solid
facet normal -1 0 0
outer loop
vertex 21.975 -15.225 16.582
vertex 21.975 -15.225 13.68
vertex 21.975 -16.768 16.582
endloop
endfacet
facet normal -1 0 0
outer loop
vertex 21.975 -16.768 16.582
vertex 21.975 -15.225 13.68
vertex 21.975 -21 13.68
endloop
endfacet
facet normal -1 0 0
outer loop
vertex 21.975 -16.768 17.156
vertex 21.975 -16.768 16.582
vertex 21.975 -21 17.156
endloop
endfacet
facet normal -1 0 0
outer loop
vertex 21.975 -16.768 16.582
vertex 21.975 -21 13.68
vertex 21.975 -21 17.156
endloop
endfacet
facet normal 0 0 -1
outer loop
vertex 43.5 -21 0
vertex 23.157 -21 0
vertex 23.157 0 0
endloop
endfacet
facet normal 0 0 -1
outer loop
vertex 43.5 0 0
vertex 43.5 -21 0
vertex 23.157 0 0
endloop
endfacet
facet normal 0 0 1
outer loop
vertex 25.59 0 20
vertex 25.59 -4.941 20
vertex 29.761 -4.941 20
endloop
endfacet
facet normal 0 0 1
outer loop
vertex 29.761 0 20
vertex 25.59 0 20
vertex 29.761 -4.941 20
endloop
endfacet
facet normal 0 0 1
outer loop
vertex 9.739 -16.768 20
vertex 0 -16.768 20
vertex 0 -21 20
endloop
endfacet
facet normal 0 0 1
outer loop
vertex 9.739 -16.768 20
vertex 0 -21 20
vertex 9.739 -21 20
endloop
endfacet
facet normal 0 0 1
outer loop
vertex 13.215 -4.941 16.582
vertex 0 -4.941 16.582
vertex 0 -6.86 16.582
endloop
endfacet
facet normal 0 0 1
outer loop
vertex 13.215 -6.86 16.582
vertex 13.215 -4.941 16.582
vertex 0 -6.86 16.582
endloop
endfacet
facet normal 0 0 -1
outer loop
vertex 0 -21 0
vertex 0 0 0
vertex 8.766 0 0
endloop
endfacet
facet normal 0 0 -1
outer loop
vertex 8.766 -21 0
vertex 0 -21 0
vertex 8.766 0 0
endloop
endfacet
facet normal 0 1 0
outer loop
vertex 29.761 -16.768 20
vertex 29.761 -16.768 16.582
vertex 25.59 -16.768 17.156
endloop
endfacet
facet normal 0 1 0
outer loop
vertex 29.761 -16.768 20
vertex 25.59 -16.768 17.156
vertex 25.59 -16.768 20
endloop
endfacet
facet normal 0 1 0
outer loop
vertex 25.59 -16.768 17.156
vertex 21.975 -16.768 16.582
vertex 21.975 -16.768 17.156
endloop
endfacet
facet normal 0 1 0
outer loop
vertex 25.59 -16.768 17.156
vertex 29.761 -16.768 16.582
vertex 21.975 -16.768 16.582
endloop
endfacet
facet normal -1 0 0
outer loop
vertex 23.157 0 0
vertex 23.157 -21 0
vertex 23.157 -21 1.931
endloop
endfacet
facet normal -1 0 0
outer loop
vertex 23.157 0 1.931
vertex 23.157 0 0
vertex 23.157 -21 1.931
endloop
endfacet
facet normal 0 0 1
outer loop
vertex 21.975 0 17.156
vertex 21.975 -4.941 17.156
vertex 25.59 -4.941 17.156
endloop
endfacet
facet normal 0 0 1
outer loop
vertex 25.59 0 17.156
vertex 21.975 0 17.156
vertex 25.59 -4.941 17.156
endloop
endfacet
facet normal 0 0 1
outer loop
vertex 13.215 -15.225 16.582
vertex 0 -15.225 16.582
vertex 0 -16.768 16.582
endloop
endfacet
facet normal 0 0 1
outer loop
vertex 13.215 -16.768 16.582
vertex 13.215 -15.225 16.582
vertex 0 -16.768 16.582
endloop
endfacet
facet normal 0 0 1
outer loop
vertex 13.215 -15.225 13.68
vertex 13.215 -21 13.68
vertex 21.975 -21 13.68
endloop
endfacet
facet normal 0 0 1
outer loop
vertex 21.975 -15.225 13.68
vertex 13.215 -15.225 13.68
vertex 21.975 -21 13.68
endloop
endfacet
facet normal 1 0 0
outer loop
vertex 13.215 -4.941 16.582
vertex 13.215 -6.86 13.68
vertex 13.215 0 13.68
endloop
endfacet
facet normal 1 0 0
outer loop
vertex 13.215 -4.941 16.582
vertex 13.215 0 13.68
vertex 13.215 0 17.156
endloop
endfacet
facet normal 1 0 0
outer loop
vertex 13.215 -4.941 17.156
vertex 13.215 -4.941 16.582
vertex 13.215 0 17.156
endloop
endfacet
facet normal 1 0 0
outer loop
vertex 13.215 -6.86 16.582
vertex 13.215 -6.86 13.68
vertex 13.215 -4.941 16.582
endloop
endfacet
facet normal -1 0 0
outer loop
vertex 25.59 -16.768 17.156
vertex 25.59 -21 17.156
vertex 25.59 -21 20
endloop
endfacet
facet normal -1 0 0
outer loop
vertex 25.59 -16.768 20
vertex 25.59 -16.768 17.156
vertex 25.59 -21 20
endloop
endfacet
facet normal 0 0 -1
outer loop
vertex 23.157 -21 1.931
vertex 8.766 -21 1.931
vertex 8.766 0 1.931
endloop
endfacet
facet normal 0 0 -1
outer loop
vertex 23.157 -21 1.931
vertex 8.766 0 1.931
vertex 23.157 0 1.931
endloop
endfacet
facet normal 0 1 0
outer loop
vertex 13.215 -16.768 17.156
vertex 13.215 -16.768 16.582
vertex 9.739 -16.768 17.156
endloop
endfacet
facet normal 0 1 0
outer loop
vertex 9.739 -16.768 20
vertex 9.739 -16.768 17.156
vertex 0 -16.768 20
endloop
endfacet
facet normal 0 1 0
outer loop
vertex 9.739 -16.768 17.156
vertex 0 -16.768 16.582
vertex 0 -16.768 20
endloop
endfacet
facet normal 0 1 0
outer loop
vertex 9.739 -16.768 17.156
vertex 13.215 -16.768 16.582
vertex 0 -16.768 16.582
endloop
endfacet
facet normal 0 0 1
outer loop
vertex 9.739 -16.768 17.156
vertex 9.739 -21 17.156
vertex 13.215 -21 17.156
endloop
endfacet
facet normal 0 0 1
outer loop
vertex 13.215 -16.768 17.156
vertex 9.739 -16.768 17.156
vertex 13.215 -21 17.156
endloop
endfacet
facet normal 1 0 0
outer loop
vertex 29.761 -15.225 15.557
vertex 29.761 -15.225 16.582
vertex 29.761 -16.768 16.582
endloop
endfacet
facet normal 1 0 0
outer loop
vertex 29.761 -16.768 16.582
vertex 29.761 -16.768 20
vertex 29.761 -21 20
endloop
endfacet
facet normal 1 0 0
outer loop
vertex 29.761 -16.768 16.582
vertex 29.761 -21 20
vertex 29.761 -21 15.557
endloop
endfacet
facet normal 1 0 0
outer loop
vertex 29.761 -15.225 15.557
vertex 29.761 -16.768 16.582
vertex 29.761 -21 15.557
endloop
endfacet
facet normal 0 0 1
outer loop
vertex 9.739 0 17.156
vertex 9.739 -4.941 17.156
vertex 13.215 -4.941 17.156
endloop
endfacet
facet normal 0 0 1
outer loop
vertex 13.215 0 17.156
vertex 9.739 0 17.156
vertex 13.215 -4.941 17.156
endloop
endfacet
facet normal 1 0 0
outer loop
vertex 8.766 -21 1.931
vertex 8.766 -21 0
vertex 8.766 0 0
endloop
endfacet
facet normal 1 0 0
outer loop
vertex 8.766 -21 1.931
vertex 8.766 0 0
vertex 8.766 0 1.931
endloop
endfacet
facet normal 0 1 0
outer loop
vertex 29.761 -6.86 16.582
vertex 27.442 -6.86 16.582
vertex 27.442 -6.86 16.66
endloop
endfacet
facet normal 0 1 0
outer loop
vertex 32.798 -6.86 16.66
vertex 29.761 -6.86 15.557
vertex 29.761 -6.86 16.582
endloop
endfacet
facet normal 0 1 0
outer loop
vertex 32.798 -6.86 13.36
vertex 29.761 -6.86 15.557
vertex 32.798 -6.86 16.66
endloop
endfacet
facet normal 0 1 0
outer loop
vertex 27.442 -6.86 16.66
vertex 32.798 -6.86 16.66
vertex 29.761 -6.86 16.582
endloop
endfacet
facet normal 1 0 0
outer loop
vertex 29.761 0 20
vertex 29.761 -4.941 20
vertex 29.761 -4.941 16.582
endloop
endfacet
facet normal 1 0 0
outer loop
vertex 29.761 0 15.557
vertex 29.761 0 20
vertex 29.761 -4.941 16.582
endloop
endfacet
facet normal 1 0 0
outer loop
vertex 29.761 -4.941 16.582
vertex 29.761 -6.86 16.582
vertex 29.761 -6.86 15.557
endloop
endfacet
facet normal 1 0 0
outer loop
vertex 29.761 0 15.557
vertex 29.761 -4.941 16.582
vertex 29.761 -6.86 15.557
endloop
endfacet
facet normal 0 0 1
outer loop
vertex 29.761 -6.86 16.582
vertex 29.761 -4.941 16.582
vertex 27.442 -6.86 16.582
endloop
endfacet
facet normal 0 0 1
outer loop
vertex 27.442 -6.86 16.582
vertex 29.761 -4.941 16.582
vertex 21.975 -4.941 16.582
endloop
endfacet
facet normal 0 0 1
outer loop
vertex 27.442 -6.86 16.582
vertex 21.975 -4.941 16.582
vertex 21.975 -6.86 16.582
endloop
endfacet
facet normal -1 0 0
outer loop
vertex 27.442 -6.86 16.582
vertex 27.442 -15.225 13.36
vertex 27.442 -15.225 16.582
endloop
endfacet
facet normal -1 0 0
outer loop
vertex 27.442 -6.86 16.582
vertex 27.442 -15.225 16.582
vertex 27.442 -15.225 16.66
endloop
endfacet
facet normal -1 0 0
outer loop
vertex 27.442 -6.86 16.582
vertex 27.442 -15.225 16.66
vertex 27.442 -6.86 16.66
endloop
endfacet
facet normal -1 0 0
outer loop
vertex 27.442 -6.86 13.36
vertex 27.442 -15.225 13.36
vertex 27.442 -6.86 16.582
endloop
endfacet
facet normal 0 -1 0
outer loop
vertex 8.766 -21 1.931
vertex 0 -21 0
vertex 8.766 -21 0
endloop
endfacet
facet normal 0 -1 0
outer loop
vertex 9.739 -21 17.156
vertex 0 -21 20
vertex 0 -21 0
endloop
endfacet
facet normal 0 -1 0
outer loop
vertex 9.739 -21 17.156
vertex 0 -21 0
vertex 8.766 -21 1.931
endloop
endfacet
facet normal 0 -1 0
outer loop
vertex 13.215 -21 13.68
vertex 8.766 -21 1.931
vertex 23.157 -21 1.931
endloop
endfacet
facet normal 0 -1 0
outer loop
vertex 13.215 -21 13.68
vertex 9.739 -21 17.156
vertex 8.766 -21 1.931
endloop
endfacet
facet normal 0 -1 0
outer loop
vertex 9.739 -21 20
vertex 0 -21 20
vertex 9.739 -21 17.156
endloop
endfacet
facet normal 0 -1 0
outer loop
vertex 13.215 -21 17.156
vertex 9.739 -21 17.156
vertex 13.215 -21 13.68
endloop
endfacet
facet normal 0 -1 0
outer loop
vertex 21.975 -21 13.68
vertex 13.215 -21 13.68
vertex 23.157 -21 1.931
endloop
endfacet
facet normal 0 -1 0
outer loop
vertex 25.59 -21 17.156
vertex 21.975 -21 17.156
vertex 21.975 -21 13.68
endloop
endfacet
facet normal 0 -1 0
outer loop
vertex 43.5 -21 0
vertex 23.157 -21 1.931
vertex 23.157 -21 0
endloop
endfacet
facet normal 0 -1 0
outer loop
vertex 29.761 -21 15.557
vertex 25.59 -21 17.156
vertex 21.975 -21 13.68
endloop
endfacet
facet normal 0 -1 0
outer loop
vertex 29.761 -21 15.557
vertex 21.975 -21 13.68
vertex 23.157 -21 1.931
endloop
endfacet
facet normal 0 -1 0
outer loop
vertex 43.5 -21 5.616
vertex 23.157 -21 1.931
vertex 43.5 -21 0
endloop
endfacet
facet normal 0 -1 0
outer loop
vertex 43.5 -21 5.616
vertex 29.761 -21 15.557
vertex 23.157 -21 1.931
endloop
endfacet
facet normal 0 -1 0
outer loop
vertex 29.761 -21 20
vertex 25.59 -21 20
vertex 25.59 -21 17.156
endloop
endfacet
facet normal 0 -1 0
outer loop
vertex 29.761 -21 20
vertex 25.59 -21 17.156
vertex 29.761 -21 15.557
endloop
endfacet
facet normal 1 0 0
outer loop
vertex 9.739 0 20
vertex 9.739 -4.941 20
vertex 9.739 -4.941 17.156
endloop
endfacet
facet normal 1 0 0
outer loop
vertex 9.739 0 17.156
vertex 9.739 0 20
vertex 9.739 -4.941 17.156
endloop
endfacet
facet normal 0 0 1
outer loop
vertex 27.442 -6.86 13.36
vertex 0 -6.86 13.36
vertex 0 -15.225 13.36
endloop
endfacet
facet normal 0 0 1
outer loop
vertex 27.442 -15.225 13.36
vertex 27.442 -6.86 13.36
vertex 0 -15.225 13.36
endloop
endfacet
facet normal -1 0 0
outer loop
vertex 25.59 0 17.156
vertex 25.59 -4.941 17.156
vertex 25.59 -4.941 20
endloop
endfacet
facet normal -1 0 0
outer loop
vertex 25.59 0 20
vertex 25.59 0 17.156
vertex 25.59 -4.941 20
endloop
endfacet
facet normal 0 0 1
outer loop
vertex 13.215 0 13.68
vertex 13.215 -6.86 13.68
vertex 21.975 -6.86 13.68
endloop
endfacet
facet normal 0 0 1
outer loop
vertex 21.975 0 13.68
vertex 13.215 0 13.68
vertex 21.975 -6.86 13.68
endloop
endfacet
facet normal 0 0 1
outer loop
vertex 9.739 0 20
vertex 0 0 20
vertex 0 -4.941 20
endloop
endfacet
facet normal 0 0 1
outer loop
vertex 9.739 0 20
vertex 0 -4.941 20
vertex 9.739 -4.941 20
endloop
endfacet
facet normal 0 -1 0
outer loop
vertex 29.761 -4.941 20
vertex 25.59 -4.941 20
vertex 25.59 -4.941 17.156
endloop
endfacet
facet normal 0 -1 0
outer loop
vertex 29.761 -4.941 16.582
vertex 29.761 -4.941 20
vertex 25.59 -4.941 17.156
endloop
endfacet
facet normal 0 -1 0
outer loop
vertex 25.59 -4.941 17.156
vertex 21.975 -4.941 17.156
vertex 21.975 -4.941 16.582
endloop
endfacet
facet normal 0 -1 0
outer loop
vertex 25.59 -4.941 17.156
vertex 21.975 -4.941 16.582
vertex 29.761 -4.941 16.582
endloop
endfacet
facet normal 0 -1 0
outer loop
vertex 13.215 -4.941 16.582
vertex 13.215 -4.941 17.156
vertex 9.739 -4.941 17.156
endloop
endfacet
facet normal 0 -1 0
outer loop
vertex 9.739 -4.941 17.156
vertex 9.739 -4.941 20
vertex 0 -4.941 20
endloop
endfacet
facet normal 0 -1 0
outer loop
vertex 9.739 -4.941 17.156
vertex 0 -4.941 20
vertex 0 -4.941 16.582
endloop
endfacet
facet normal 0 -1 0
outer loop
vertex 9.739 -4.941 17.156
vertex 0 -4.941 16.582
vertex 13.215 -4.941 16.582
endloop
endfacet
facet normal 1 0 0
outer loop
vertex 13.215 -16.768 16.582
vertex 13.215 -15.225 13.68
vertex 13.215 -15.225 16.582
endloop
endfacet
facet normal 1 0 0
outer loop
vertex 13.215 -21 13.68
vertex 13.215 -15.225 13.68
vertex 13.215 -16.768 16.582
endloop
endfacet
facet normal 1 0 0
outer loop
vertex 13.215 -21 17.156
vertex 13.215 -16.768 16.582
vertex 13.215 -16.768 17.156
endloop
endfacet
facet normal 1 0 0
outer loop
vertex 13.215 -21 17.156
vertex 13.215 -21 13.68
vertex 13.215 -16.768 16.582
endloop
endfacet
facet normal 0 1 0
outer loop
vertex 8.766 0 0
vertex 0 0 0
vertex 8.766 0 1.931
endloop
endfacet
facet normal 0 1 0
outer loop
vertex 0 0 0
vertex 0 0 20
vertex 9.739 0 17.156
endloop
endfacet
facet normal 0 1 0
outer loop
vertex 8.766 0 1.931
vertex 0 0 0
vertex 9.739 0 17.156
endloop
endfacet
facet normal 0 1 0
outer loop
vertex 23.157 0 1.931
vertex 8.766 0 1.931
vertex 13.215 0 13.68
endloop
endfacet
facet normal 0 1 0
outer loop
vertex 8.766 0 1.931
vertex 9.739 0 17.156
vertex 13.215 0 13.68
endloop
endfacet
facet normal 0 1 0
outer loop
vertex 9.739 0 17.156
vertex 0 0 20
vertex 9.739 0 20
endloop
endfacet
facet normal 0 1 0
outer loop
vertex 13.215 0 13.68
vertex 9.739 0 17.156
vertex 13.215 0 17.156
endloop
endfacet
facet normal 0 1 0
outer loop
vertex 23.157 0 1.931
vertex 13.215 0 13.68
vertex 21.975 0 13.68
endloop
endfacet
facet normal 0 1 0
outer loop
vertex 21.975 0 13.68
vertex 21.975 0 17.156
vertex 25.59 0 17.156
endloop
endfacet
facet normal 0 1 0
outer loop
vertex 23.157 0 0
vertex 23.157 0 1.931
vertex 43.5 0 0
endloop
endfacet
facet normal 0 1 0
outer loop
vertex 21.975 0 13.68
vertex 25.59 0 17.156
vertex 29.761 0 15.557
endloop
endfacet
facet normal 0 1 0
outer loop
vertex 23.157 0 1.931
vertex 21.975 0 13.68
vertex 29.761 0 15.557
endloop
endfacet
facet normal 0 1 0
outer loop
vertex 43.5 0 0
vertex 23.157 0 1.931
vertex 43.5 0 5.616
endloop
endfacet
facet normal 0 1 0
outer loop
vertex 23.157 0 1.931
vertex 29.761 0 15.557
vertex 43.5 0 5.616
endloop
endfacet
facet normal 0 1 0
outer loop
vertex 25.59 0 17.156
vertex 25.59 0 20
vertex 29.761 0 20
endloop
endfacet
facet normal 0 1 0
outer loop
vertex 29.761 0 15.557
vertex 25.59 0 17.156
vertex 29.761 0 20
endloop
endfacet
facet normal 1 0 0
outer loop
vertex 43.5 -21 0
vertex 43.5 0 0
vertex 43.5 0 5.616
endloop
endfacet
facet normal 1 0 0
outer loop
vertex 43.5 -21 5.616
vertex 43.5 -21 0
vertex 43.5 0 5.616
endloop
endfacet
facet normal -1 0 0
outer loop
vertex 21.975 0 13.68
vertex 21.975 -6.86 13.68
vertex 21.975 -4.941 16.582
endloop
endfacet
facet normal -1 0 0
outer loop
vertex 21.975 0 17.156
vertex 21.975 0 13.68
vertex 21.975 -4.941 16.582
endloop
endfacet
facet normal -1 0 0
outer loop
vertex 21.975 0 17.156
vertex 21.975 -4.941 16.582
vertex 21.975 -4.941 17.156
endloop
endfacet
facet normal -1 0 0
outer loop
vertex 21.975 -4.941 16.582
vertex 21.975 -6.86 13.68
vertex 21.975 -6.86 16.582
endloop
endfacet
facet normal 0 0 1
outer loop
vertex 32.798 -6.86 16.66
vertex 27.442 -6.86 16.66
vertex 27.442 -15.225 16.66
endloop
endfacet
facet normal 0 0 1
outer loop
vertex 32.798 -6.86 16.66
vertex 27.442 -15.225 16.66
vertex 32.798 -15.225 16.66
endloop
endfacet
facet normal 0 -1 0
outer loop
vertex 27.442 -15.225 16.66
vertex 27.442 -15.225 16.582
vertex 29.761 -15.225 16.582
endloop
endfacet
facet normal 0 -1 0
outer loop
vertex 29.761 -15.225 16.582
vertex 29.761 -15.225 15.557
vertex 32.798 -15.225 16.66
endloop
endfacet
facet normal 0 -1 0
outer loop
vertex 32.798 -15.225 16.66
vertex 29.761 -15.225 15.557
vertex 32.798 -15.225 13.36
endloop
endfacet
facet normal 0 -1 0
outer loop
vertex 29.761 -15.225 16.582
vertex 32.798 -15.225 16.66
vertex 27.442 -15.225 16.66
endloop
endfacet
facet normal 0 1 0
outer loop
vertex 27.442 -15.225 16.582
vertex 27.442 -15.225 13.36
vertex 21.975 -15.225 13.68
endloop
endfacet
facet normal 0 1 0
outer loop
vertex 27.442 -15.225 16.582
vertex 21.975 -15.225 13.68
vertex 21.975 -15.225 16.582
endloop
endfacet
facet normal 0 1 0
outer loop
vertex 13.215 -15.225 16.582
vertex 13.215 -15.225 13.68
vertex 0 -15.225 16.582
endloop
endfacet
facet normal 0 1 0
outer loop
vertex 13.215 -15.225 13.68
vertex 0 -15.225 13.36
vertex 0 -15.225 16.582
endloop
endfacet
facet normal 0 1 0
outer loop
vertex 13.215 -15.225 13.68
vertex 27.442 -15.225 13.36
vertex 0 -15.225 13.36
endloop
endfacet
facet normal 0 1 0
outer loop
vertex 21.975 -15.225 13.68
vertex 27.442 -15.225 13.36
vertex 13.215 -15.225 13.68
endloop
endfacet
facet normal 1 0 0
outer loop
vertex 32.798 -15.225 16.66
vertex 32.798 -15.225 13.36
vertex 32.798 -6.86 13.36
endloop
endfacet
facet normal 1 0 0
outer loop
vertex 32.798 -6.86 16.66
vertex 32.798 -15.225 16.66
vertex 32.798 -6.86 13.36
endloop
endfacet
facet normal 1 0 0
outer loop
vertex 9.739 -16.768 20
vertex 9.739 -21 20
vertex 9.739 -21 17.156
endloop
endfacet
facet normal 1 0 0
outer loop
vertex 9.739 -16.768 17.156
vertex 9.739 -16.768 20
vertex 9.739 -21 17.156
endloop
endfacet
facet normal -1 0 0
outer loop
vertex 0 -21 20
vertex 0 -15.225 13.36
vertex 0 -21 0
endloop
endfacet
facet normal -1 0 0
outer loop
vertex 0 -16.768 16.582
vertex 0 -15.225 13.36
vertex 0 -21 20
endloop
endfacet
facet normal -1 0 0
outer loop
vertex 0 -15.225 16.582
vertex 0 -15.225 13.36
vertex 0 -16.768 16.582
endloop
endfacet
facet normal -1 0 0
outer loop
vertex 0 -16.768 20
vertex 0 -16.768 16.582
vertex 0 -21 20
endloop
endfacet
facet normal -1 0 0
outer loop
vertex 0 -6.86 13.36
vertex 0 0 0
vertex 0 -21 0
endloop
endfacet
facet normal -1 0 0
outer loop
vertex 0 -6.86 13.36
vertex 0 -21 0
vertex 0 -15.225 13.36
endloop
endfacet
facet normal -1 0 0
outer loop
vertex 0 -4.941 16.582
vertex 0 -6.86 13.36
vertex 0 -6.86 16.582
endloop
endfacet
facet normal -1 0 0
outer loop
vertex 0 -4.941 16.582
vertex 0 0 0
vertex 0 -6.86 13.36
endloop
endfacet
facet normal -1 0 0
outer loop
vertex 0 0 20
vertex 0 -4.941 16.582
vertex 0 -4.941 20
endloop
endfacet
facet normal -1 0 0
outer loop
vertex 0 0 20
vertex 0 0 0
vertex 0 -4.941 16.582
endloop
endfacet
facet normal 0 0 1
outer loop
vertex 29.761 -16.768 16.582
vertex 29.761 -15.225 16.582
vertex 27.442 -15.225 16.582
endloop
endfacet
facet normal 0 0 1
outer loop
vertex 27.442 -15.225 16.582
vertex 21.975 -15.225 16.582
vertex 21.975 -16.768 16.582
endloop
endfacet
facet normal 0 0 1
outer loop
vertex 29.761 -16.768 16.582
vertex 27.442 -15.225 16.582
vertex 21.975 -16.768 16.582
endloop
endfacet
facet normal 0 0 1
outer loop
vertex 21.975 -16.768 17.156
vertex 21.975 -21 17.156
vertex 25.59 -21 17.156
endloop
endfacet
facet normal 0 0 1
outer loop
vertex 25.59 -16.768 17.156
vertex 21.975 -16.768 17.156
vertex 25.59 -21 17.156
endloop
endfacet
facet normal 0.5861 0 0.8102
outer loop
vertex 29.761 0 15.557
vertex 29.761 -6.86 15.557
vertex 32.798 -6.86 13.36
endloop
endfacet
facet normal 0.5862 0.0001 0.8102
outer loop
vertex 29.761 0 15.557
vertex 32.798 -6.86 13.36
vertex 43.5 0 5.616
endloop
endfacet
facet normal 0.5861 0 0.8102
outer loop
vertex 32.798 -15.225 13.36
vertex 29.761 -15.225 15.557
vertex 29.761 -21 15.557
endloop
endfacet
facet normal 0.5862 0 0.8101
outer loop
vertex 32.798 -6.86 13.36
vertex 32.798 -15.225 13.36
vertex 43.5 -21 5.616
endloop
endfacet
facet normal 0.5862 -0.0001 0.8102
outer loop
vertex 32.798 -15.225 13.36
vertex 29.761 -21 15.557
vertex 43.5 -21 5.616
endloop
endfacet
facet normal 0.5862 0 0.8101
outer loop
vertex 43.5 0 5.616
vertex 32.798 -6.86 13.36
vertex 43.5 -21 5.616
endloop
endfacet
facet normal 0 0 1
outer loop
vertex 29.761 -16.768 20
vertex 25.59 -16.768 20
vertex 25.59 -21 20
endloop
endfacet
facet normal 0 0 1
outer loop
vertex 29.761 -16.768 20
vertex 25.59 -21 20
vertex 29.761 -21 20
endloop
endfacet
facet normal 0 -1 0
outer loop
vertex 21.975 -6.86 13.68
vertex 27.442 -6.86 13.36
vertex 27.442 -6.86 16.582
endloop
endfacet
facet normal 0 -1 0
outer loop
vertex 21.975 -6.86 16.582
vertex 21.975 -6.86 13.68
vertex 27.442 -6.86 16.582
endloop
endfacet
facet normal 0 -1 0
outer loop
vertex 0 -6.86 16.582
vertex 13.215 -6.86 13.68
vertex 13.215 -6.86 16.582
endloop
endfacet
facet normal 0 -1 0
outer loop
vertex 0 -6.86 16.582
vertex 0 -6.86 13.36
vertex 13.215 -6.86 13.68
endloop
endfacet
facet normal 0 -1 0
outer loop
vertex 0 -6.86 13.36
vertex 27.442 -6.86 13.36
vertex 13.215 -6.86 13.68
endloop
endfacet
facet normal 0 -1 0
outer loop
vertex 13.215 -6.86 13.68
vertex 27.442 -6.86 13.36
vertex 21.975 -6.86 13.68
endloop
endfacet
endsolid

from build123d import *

# Parameters (mm, degrees)
F0_W      = 43.5
F0_H      = 20
F1_DEPTH  = 21
F2_W      = 23.5
F2_H      = 2
F3_DEPTH  = 79
F4_W      = 8.7595684454
F4_H      = 3.4760199487
F4_W_2    = 14.3907200545
F4_H_2    = 1.9311879296
F5_DEPTH  = 21.001
F6_W      = 18.0619247258
F6_H      = 11.0779828392
F7_DEPTH  = 20.001
F8_W      = 8.364611771
F8_H      = 3.2224319875
F9_DEPTH  = 43.501
F10_DEPTH = 13.8
F11_DEPTH = 16.0159093717
F12_W     = 5.3562937983
F12_H     = 8.364611771
F13_DEPTH = 3.3


# Not quite as in the source:
# - an extrude ends at something that could not be found from the text; its depth is read off the source's solid


with BuildPart() as f1:
    # F0 (on Front) → F1 (new body)
    with BuildSketch(Plane.XZ):
        with Locations((21.75, 10)):
            Rectangle(F0_W, F0_H)
    extrude(amount=F1_DEPTH)

    # F2 (on Front) → F3 (cut, through all)
    with BuildSketch(Plane.XZ):
        with Locations((15.8696506918, 1)):
            Rectangle(F2_W, F2_H)
    extrude(amount=-F3_DEPTH, mode=Mode.SUBTRACT)

    # F4 (on face) → F5 (cut, through all)
    with BuildSketch(Plane.XZ.offset(21)):
        Polygon((25.5898274481, 20), (9.7391782328, 20), (9.7391782328, 17.1561539173), (13.2151981816, 17.1561539173), (21.974766627, 17.1561539173), (25.5898274481, 17.1561539173), align=None)
        with Locations((17.5949824043, 15.418143943)):
            Rectangle(F4_W, F4_H)
        with Locations((15.9612530842, 0.9655939648)):
            Rectangle(F4_W_2, F4_H_2)
        Polygon((43.5, 20), (29.7610498965, 20), (29.7610498965, 15.5571838841), (43.5, 5.6157684885), align=None)
    extrude(amount=-F5_DEPTH, mode=Mode.SUBTRACT)

    # F6 (on Top) → F7 (cut, through all)
    with BuildSketch(Plane.XY):
        with Locations((38.8933513314, -10.4759179521)):
            Rectangle(F6_W, F6_H)
    extrude(amount=F7_DEPTH, mode=Mode.SUBTRACT)

    # F8 (on face) → F9 (cut, through all)
    with BuildSketch(Plane(origin=(0, 0, 0), x_dir=(0, -1, 0), z_dir=(-1, 0, 0))):
        with Locations((11.04275533, 14.9709172547)):
            Rectangle(F8_W, F8_H)
        Polygon((16.7677160352, 20), (4.9407021143, 20), (4.9407021143, 16.5821332484), (6.8604494445, 16.5821332484), (15.2250612155, 16.5821332484), (16.7677160352, 16.5821332484), align=None)
    extrude(amount=-F9_DEPTH, mode=Mode.SUBTRACT)

    # F10 (add): a face of the model
    f10_faces = [f1.faces().sort_by_distance(p)[0] for p in [
        (29.8623889685, -10.4104180179, 6.9700489552),
    ]]
    extrude(f10_faces, amount=F10_DEPTH)

    # F11 (cut, through all): a face of the model
    f11_faces = [f1.faces().sort_by_distance(p)[0] for p in [
        (39.1208034391, -16.0149093717, 12.034105167),
    ]]
    extrude(f11_faces, amount=-F11_DEPTH, mode=Mode.SUBTRACT)

    # F12 (on face) → F13 (join)
    with BuildSketch(Plane.XY.offset(13.3597012609)):
        with Locations((30.1198049788, -11.04275533)):
            Rectangle(F12_W, F12_H)
    extrude(amount=F13_DEPTH)


solid = f1.part
